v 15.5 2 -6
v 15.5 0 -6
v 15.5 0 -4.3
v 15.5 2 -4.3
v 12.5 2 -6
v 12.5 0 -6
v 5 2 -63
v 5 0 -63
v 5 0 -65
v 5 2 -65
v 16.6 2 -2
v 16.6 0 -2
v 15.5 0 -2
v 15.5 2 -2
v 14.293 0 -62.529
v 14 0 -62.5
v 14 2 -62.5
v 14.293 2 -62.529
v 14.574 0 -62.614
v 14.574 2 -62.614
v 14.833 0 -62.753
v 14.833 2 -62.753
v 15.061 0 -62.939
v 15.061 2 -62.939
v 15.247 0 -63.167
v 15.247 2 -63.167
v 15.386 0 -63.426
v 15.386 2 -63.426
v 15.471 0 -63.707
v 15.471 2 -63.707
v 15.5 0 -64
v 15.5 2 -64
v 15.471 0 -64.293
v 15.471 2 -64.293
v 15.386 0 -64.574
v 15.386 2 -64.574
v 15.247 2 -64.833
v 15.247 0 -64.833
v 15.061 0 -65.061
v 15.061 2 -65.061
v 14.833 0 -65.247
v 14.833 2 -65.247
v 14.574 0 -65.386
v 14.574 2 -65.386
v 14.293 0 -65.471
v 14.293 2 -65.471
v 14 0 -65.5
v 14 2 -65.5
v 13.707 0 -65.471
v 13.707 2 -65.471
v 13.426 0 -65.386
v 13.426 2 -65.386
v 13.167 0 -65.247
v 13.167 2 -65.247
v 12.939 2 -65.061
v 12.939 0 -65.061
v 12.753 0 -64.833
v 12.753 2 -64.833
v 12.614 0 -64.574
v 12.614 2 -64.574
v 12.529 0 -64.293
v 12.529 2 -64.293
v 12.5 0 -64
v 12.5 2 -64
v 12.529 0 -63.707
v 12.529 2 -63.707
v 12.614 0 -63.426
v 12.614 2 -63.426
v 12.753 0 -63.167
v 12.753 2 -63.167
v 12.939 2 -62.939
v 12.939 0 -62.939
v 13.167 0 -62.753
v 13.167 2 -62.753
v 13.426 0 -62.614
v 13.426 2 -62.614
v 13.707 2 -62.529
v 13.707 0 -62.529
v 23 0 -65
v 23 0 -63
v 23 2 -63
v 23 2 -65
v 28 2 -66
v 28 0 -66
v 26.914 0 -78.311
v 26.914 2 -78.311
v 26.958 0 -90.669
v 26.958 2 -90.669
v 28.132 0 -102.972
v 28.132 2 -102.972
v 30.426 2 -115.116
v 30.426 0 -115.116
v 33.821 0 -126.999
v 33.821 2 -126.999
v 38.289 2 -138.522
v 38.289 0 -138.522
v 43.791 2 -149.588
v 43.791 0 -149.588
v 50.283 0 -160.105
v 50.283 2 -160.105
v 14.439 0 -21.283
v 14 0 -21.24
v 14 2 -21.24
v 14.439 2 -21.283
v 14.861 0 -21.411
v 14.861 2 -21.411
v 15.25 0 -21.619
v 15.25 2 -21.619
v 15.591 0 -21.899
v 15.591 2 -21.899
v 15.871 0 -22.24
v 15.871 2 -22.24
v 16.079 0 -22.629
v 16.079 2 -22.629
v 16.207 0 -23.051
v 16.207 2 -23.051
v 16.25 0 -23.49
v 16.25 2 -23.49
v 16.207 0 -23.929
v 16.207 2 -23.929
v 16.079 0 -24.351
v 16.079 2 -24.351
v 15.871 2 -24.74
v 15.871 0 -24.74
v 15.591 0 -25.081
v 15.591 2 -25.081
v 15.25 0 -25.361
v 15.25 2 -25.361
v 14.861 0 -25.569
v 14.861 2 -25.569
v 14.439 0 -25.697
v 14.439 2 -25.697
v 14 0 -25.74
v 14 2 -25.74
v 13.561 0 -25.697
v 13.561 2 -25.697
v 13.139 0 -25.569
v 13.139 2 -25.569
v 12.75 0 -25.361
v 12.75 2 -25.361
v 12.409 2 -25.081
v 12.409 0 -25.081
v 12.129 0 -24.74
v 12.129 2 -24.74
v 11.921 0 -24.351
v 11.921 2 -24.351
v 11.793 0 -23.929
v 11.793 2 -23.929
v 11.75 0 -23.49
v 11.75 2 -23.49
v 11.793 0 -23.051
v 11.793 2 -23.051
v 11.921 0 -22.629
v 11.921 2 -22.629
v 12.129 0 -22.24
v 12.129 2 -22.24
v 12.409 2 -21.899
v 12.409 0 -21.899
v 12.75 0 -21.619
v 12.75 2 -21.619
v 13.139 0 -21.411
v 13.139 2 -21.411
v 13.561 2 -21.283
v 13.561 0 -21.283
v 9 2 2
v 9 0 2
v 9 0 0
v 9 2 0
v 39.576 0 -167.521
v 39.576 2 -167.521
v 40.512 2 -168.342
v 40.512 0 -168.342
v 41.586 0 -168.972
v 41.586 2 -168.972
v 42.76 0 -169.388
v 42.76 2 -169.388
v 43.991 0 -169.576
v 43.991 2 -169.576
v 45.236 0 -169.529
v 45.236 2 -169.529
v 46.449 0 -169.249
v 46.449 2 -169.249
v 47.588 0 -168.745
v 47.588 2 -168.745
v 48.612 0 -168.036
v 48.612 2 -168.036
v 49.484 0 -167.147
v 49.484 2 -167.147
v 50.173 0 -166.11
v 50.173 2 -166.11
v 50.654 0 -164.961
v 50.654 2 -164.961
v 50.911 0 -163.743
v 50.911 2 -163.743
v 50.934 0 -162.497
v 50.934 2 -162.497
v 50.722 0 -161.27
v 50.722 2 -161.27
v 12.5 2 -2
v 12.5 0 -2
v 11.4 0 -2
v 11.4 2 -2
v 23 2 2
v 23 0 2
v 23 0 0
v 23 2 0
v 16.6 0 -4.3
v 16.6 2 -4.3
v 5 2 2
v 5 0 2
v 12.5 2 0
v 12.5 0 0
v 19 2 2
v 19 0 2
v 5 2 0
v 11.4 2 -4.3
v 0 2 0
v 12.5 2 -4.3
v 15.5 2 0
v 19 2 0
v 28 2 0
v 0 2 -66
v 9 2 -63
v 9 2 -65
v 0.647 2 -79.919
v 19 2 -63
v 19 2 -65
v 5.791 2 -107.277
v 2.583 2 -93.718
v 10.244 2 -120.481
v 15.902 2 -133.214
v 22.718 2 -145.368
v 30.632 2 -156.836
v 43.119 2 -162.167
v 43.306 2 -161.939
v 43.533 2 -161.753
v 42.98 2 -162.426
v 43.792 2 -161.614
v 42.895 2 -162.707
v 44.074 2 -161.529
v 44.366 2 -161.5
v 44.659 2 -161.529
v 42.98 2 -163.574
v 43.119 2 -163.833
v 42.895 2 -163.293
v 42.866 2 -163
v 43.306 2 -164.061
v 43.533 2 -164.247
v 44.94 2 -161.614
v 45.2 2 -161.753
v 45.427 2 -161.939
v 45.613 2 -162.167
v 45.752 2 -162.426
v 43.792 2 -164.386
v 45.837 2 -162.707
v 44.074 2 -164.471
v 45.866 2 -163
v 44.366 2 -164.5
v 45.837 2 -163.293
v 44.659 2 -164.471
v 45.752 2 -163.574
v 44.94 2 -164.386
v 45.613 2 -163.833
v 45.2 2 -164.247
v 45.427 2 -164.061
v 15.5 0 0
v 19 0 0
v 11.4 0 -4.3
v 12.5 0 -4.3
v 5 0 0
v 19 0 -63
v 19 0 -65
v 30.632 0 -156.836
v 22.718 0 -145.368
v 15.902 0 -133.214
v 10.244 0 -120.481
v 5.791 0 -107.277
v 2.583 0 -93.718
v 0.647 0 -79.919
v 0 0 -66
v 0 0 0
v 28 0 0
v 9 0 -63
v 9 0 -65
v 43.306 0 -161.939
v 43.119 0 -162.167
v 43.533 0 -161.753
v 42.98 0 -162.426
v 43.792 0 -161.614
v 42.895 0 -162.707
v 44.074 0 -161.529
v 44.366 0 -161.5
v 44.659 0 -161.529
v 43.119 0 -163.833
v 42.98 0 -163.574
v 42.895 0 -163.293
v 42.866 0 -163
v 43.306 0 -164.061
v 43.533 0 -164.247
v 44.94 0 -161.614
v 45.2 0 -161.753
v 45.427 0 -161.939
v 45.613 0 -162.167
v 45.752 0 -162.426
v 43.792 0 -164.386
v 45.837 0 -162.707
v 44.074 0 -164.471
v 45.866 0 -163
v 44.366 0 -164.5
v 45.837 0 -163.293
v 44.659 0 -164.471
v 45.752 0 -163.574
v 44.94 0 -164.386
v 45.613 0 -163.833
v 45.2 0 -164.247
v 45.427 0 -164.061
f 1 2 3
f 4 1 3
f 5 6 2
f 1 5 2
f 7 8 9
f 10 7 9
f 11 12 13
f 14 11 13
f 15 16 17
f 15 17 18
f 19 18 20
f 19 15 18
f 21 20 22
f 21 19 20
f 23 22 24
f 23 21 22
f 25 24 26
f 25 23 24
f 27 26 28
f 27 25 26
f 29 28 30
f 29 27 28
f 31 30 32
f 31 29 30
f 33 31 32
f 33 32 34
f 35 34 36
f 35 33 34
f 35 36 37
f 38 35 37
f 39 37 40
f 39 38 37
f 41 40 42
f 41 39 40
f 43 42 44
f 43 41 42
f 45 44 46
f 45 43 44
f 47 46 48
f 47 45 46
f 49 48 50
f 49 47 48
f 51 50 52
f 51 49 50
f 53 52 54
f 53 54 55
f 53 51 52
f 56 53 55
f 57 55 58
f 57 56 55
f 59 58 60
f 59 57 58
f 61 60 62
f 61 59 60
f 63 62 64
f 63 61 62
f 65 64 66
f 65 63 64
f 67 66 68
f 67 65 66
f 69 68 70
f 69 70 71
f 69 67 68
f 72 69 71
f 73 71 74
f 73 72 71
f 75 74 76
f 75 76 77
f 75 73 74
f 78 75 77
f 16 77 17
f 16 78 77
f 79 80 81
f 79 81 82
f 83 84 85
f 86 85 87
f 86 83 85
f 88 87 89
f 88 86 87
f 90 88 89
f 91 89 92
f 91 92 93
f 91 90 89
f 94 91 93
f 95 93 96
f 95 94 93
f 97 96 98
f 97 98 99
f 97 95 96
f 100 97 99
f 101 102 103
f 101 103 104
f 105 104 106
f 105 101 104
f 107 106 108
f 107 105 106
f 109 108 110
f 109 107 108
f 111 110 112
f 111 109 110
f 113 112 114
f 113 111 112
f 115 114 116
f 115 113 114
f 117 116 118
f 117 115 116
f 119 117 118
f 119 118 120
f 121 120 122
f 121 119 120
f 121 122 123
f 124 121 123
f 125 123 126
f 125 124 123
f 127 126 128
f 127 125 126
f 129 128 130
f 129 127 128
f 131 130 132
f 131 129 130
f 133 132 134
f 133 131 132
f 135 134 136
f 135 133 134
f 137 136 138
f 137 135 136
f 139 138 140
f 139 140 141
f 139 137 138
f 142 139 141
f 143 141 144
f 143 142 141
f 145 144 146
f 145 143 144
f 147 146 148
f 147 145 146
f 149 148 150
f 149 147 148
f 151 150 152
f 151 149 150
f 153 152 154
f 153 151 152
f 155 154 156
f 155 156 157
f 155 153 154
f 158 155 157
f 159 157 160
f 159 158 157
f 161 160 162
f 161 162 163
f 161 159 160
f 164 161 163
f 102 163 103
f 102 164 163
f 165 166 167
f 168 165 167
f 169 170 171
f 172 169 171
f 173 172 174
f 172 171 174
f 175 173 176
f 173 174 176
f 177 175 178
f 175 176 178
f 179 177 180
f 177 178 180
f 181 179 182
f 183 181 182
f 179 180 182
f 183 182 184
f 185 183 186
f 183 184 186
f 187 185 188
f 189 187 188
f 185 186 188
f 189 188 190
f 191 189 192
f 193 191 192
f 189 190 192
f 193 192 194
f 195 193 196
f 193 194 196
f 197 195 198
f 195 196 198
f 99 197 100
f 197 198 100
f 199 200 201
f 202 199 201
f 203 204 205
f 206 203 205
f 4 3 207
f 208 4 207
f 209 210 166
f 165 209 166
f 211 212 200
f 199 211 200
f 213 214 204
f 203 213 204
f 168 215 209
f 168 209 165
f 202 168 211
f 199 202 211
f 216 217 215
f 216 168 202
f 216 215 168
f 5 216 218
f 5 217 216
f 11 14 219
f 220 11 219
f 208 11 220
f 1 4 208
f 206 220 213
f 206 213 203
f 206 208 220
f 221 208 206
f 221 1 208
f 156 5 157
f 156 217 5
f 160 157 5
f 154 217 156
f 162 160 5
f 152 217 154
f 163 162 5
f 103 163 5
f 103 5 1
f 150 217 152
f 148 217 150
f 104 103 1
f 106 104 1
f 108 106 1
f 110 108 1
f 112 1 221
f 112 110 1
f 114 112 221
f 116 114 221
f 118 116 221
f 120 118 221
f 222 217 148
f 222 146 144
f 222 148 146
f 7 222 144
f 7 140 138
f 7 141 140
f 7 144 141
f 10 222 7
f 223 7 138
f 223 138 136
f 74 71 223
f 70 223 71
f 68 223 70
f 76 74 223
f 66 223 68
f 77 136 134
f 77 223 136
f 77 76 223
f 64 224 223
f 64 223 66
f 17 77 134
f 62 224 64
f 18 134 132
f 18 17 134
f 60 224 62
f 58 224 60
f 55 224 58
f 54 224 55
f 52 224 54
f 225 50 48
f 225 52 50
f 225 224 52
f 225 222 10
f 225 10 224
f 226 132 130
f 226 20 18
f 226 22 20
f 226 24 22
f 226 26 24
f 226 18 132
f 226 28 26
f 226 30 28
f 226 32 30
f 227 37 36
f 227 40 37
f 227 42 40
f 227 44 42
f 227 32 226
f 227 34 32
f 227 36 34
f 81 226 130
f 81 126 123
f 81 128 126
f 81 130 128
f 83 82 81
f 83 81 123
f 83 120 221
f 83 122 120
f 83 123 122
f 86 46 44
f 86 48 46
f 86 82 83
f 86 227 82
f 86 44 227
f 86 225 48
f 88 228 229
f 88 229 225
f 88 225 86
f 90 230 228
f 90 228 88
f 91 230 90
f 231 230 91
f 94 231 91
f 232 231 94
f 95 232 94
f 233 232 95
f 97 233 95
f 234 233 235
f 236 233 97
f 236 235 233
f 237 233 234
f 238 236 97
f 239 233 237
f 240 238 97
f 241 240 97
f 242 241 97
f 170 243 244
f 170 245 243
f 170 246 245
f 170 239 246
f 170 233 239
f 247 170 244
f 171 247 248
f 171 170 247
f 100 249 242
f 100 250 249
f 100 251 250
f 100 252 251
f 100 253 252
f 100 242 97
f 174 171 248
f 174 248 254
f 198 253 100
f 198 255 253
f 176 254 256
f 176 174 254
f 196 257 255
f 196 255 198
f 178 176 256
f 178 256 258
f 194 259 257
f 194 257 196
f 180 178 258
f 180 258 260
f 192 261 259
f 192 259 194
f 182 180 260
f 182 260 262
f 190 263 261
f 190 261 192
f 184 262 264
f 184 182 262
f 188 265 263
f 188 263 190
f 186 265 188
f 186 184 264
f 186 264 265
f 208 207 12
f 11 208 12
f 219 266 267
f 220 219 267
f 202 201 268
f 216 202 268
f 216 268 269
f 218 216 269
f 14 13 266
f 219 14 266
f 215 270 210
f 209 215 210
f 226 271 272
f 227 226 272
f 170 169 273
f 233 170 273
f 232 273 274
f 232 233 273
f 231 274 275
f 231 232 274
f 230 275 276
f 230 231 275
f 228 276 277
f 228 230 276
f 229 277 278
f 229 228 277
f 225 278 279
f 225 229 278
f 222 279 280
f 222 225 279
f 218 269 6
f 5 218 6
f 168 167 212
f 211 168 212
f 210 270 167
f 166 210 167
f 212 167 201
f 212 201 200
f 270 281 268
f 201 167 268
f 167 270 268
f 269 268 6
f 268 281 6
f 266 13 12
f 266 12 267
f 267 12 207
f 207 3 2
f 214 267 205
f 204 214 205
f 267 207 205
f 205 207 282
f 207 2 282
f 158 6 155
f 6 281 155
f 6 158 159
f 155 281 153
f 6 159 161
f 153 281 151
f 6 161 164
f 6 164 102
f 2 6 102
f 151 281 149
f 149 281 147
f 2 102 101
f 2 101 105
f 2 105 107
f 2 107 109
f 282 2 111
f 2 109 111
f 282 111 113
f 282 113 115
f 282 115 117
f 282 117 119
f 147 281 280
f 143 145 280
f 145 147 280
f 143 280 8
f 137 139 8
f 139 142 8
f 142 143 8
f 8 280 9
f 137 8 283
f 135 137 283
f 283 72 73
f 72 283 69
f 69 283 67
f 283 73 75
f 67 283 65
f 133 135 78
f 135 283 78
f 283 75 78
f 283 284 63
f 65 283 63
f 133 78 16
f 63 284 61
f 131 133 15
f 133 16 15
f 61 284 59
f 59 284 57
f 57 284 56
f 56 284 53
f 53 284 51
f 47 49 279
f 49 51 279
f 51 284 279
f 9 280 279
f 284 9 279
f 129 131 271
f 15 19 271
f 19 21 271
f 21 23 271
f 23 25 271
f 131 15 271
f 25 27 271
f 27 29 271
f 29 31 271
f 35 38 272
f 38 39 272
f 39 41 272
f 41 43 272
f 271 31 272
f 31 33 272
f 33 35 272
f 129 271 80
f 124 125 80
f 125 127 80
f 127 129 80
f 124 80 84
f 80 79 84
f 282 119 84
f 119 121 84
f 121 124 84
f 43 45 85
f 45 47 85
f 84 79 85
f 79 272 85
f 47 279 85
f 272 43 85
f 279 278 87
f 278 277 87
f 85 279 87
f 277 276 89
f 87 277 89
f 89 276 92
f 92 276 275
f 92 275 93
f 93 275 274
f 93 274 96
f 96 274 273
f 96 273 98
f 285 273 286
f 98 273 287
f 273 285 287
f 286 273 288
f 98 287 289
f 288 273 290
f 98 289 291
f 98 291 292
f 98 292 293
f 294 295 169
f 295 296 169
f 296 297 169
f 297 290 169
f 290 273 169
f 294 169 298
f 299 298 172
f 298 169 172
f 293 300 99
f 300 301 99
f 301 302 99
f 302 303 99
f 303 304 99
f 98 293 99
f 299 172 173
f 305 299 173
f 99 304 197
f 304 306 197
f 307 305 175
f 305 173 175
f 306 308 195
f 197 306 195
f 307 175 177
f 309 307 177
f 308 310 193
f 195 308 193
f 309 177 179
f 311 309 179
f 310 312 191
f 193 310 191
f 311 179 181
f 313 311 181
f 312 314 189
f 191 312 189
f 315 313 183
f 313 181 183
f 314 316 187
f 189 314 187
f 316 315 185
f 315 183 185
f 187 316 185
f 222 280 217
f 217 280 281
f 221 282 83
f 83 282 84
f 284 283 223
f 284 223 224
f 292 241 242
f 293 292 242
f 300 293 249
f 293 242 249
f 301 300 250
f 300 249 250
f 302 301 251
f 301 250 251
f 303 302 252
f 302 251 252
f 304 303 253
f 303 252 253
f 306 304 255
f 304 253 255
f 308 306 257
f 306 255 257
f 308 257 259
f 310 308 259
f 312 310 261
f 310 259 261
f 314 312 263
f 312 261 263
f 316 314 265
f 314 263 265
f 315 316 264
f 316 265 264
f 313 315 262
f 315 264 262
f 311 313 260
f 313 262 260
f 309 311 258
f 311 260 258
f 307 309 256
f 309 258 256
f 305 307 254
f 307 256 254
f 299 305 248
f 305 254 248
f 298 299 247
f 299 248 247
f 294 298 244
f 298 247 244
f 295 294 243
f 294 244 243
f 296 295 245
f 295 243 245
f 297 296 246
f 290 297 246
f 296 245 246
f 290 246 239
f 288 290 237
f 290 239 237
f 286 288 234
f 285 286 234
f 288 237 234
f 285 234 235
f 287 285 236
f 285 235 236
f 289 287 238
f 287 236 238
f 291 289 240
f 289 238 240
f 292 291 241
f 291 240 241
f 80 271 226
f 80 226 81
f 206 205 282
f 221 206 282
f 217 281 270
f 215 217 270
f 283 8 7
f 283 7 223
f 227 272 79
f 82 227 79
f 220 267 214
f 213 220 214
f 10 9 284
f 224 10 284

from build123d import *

# Parameters (mm, degrees)
SKETCH1_R           = 1.5
SKETCH1_R_2         = 2.25
SKETCH1_W           = 4
SKETCH1_H           = 2
BOSS_EXTRUDE1_DEPTH = 2
BOSS_EXTRUDE2_DEPTH = 2
SKETCH4_R           = 1.5
CUT_EXTRUDE1_DEPTH  = 2


with BuildPart() as part:
    # Sketch1 → Boss-Extrude1 (new body)
    with BuildSketch(Plane(origin=(0, 0, 0), x_dir=(1, 0, 0), z_dir=(0, 1, 0))):
        Polygon((0, 0), (5, 0), (5, -2), (9, -2), (9, 0), (12.5, 0), (12.5, 2), (11.4, 2), (11.4, 4.3), (12.5, 4.3), (12.5, 6), (15.5, 6), (15.5, 4.3), (16.6, 4.3), (16.6, 2), (15.5, 2), (15.5, 0), (19, 0), (19, -2), (23, -2), (23, 0), (28, 0), (28, 66), (0, 66), align=None)
        with Locations(Location((14, 64, 0), (0, 0, 270))):
            Circle(SKETCH1_R, mode=Mode.SUBTRACT)
        with Locations(Location((14, 23.49, 0), (0, 0, 270))):
            Circle(SKETCH1_R_2, mode=Mode.SUBTRACT)
        with Locations((7, 64)):
            Rectangle(SKETCH1_W, SKETCH1_H, mode=Mode.SUBTRACT)
        with Locations((21, 64)):
            Rectangle(SKETCH1_W, SKETCH1_H, mode=Mode.SUBTRACT)
    extrude(amount=BOSS_EXTRUDE1_DEPTH)

    # Sketch2 → Boss-Extrude2 (add)
    with BuildSketch(Plane(origin=(0, 2, 0), x_dir=(1, 0, 0), z_dir=(0, 1, 0))):
        with BuildLine():
            Line((0, 66), (28, 66))
            ThreePointArc((28, 66), (34.819271185, 129.864214399), (70.378490249, 183.349560802))
            ThreePointArc((70.378490249, 183.349560802), (70.223472253, 188.82876401), (64.776007814, 189.43772177))
            ThreePointArc((64.776007814, 189.43772177), (17.177564343, 135.700793296), (0, 66))
        make_face()
    extrude(amount=-BOSS_EXTRUDE2_DEPTH)

    # Sketch4 → Cut-Extrude1 (cut)
    with BuildSketch(Plane(origin=(0, 2, 0), x_dir=(1, 0, 0), z_dir=(0, 1, 0))):
        with Locations(Location((44.36627387, 163, 0), (0, 0, 270))):
            Circle(SKETCH4_R)
        with BuildLine():
            Line((49.278104547, 158.611243867), (90.336581865, 196.333434103))
            Line((90.336581865, 196.333434103), (75.550012159, 212.427781571))
            Line((75.550012159, 212.427781571), (35.469078733, 175.603702981))
            Line((35.469078733, 175.603702981), (39.454443193, 167.388756133))
            ThreePointArc((39.454443193, 167.388756133), (48.755030003, 167.911830677), (49.278104547, 158.611243867))
        make_face()
    extrude(amount=-CUT_EXTRUDE1_DEPTH, mode=Mode.SUBTRACT)


solid = part.part
